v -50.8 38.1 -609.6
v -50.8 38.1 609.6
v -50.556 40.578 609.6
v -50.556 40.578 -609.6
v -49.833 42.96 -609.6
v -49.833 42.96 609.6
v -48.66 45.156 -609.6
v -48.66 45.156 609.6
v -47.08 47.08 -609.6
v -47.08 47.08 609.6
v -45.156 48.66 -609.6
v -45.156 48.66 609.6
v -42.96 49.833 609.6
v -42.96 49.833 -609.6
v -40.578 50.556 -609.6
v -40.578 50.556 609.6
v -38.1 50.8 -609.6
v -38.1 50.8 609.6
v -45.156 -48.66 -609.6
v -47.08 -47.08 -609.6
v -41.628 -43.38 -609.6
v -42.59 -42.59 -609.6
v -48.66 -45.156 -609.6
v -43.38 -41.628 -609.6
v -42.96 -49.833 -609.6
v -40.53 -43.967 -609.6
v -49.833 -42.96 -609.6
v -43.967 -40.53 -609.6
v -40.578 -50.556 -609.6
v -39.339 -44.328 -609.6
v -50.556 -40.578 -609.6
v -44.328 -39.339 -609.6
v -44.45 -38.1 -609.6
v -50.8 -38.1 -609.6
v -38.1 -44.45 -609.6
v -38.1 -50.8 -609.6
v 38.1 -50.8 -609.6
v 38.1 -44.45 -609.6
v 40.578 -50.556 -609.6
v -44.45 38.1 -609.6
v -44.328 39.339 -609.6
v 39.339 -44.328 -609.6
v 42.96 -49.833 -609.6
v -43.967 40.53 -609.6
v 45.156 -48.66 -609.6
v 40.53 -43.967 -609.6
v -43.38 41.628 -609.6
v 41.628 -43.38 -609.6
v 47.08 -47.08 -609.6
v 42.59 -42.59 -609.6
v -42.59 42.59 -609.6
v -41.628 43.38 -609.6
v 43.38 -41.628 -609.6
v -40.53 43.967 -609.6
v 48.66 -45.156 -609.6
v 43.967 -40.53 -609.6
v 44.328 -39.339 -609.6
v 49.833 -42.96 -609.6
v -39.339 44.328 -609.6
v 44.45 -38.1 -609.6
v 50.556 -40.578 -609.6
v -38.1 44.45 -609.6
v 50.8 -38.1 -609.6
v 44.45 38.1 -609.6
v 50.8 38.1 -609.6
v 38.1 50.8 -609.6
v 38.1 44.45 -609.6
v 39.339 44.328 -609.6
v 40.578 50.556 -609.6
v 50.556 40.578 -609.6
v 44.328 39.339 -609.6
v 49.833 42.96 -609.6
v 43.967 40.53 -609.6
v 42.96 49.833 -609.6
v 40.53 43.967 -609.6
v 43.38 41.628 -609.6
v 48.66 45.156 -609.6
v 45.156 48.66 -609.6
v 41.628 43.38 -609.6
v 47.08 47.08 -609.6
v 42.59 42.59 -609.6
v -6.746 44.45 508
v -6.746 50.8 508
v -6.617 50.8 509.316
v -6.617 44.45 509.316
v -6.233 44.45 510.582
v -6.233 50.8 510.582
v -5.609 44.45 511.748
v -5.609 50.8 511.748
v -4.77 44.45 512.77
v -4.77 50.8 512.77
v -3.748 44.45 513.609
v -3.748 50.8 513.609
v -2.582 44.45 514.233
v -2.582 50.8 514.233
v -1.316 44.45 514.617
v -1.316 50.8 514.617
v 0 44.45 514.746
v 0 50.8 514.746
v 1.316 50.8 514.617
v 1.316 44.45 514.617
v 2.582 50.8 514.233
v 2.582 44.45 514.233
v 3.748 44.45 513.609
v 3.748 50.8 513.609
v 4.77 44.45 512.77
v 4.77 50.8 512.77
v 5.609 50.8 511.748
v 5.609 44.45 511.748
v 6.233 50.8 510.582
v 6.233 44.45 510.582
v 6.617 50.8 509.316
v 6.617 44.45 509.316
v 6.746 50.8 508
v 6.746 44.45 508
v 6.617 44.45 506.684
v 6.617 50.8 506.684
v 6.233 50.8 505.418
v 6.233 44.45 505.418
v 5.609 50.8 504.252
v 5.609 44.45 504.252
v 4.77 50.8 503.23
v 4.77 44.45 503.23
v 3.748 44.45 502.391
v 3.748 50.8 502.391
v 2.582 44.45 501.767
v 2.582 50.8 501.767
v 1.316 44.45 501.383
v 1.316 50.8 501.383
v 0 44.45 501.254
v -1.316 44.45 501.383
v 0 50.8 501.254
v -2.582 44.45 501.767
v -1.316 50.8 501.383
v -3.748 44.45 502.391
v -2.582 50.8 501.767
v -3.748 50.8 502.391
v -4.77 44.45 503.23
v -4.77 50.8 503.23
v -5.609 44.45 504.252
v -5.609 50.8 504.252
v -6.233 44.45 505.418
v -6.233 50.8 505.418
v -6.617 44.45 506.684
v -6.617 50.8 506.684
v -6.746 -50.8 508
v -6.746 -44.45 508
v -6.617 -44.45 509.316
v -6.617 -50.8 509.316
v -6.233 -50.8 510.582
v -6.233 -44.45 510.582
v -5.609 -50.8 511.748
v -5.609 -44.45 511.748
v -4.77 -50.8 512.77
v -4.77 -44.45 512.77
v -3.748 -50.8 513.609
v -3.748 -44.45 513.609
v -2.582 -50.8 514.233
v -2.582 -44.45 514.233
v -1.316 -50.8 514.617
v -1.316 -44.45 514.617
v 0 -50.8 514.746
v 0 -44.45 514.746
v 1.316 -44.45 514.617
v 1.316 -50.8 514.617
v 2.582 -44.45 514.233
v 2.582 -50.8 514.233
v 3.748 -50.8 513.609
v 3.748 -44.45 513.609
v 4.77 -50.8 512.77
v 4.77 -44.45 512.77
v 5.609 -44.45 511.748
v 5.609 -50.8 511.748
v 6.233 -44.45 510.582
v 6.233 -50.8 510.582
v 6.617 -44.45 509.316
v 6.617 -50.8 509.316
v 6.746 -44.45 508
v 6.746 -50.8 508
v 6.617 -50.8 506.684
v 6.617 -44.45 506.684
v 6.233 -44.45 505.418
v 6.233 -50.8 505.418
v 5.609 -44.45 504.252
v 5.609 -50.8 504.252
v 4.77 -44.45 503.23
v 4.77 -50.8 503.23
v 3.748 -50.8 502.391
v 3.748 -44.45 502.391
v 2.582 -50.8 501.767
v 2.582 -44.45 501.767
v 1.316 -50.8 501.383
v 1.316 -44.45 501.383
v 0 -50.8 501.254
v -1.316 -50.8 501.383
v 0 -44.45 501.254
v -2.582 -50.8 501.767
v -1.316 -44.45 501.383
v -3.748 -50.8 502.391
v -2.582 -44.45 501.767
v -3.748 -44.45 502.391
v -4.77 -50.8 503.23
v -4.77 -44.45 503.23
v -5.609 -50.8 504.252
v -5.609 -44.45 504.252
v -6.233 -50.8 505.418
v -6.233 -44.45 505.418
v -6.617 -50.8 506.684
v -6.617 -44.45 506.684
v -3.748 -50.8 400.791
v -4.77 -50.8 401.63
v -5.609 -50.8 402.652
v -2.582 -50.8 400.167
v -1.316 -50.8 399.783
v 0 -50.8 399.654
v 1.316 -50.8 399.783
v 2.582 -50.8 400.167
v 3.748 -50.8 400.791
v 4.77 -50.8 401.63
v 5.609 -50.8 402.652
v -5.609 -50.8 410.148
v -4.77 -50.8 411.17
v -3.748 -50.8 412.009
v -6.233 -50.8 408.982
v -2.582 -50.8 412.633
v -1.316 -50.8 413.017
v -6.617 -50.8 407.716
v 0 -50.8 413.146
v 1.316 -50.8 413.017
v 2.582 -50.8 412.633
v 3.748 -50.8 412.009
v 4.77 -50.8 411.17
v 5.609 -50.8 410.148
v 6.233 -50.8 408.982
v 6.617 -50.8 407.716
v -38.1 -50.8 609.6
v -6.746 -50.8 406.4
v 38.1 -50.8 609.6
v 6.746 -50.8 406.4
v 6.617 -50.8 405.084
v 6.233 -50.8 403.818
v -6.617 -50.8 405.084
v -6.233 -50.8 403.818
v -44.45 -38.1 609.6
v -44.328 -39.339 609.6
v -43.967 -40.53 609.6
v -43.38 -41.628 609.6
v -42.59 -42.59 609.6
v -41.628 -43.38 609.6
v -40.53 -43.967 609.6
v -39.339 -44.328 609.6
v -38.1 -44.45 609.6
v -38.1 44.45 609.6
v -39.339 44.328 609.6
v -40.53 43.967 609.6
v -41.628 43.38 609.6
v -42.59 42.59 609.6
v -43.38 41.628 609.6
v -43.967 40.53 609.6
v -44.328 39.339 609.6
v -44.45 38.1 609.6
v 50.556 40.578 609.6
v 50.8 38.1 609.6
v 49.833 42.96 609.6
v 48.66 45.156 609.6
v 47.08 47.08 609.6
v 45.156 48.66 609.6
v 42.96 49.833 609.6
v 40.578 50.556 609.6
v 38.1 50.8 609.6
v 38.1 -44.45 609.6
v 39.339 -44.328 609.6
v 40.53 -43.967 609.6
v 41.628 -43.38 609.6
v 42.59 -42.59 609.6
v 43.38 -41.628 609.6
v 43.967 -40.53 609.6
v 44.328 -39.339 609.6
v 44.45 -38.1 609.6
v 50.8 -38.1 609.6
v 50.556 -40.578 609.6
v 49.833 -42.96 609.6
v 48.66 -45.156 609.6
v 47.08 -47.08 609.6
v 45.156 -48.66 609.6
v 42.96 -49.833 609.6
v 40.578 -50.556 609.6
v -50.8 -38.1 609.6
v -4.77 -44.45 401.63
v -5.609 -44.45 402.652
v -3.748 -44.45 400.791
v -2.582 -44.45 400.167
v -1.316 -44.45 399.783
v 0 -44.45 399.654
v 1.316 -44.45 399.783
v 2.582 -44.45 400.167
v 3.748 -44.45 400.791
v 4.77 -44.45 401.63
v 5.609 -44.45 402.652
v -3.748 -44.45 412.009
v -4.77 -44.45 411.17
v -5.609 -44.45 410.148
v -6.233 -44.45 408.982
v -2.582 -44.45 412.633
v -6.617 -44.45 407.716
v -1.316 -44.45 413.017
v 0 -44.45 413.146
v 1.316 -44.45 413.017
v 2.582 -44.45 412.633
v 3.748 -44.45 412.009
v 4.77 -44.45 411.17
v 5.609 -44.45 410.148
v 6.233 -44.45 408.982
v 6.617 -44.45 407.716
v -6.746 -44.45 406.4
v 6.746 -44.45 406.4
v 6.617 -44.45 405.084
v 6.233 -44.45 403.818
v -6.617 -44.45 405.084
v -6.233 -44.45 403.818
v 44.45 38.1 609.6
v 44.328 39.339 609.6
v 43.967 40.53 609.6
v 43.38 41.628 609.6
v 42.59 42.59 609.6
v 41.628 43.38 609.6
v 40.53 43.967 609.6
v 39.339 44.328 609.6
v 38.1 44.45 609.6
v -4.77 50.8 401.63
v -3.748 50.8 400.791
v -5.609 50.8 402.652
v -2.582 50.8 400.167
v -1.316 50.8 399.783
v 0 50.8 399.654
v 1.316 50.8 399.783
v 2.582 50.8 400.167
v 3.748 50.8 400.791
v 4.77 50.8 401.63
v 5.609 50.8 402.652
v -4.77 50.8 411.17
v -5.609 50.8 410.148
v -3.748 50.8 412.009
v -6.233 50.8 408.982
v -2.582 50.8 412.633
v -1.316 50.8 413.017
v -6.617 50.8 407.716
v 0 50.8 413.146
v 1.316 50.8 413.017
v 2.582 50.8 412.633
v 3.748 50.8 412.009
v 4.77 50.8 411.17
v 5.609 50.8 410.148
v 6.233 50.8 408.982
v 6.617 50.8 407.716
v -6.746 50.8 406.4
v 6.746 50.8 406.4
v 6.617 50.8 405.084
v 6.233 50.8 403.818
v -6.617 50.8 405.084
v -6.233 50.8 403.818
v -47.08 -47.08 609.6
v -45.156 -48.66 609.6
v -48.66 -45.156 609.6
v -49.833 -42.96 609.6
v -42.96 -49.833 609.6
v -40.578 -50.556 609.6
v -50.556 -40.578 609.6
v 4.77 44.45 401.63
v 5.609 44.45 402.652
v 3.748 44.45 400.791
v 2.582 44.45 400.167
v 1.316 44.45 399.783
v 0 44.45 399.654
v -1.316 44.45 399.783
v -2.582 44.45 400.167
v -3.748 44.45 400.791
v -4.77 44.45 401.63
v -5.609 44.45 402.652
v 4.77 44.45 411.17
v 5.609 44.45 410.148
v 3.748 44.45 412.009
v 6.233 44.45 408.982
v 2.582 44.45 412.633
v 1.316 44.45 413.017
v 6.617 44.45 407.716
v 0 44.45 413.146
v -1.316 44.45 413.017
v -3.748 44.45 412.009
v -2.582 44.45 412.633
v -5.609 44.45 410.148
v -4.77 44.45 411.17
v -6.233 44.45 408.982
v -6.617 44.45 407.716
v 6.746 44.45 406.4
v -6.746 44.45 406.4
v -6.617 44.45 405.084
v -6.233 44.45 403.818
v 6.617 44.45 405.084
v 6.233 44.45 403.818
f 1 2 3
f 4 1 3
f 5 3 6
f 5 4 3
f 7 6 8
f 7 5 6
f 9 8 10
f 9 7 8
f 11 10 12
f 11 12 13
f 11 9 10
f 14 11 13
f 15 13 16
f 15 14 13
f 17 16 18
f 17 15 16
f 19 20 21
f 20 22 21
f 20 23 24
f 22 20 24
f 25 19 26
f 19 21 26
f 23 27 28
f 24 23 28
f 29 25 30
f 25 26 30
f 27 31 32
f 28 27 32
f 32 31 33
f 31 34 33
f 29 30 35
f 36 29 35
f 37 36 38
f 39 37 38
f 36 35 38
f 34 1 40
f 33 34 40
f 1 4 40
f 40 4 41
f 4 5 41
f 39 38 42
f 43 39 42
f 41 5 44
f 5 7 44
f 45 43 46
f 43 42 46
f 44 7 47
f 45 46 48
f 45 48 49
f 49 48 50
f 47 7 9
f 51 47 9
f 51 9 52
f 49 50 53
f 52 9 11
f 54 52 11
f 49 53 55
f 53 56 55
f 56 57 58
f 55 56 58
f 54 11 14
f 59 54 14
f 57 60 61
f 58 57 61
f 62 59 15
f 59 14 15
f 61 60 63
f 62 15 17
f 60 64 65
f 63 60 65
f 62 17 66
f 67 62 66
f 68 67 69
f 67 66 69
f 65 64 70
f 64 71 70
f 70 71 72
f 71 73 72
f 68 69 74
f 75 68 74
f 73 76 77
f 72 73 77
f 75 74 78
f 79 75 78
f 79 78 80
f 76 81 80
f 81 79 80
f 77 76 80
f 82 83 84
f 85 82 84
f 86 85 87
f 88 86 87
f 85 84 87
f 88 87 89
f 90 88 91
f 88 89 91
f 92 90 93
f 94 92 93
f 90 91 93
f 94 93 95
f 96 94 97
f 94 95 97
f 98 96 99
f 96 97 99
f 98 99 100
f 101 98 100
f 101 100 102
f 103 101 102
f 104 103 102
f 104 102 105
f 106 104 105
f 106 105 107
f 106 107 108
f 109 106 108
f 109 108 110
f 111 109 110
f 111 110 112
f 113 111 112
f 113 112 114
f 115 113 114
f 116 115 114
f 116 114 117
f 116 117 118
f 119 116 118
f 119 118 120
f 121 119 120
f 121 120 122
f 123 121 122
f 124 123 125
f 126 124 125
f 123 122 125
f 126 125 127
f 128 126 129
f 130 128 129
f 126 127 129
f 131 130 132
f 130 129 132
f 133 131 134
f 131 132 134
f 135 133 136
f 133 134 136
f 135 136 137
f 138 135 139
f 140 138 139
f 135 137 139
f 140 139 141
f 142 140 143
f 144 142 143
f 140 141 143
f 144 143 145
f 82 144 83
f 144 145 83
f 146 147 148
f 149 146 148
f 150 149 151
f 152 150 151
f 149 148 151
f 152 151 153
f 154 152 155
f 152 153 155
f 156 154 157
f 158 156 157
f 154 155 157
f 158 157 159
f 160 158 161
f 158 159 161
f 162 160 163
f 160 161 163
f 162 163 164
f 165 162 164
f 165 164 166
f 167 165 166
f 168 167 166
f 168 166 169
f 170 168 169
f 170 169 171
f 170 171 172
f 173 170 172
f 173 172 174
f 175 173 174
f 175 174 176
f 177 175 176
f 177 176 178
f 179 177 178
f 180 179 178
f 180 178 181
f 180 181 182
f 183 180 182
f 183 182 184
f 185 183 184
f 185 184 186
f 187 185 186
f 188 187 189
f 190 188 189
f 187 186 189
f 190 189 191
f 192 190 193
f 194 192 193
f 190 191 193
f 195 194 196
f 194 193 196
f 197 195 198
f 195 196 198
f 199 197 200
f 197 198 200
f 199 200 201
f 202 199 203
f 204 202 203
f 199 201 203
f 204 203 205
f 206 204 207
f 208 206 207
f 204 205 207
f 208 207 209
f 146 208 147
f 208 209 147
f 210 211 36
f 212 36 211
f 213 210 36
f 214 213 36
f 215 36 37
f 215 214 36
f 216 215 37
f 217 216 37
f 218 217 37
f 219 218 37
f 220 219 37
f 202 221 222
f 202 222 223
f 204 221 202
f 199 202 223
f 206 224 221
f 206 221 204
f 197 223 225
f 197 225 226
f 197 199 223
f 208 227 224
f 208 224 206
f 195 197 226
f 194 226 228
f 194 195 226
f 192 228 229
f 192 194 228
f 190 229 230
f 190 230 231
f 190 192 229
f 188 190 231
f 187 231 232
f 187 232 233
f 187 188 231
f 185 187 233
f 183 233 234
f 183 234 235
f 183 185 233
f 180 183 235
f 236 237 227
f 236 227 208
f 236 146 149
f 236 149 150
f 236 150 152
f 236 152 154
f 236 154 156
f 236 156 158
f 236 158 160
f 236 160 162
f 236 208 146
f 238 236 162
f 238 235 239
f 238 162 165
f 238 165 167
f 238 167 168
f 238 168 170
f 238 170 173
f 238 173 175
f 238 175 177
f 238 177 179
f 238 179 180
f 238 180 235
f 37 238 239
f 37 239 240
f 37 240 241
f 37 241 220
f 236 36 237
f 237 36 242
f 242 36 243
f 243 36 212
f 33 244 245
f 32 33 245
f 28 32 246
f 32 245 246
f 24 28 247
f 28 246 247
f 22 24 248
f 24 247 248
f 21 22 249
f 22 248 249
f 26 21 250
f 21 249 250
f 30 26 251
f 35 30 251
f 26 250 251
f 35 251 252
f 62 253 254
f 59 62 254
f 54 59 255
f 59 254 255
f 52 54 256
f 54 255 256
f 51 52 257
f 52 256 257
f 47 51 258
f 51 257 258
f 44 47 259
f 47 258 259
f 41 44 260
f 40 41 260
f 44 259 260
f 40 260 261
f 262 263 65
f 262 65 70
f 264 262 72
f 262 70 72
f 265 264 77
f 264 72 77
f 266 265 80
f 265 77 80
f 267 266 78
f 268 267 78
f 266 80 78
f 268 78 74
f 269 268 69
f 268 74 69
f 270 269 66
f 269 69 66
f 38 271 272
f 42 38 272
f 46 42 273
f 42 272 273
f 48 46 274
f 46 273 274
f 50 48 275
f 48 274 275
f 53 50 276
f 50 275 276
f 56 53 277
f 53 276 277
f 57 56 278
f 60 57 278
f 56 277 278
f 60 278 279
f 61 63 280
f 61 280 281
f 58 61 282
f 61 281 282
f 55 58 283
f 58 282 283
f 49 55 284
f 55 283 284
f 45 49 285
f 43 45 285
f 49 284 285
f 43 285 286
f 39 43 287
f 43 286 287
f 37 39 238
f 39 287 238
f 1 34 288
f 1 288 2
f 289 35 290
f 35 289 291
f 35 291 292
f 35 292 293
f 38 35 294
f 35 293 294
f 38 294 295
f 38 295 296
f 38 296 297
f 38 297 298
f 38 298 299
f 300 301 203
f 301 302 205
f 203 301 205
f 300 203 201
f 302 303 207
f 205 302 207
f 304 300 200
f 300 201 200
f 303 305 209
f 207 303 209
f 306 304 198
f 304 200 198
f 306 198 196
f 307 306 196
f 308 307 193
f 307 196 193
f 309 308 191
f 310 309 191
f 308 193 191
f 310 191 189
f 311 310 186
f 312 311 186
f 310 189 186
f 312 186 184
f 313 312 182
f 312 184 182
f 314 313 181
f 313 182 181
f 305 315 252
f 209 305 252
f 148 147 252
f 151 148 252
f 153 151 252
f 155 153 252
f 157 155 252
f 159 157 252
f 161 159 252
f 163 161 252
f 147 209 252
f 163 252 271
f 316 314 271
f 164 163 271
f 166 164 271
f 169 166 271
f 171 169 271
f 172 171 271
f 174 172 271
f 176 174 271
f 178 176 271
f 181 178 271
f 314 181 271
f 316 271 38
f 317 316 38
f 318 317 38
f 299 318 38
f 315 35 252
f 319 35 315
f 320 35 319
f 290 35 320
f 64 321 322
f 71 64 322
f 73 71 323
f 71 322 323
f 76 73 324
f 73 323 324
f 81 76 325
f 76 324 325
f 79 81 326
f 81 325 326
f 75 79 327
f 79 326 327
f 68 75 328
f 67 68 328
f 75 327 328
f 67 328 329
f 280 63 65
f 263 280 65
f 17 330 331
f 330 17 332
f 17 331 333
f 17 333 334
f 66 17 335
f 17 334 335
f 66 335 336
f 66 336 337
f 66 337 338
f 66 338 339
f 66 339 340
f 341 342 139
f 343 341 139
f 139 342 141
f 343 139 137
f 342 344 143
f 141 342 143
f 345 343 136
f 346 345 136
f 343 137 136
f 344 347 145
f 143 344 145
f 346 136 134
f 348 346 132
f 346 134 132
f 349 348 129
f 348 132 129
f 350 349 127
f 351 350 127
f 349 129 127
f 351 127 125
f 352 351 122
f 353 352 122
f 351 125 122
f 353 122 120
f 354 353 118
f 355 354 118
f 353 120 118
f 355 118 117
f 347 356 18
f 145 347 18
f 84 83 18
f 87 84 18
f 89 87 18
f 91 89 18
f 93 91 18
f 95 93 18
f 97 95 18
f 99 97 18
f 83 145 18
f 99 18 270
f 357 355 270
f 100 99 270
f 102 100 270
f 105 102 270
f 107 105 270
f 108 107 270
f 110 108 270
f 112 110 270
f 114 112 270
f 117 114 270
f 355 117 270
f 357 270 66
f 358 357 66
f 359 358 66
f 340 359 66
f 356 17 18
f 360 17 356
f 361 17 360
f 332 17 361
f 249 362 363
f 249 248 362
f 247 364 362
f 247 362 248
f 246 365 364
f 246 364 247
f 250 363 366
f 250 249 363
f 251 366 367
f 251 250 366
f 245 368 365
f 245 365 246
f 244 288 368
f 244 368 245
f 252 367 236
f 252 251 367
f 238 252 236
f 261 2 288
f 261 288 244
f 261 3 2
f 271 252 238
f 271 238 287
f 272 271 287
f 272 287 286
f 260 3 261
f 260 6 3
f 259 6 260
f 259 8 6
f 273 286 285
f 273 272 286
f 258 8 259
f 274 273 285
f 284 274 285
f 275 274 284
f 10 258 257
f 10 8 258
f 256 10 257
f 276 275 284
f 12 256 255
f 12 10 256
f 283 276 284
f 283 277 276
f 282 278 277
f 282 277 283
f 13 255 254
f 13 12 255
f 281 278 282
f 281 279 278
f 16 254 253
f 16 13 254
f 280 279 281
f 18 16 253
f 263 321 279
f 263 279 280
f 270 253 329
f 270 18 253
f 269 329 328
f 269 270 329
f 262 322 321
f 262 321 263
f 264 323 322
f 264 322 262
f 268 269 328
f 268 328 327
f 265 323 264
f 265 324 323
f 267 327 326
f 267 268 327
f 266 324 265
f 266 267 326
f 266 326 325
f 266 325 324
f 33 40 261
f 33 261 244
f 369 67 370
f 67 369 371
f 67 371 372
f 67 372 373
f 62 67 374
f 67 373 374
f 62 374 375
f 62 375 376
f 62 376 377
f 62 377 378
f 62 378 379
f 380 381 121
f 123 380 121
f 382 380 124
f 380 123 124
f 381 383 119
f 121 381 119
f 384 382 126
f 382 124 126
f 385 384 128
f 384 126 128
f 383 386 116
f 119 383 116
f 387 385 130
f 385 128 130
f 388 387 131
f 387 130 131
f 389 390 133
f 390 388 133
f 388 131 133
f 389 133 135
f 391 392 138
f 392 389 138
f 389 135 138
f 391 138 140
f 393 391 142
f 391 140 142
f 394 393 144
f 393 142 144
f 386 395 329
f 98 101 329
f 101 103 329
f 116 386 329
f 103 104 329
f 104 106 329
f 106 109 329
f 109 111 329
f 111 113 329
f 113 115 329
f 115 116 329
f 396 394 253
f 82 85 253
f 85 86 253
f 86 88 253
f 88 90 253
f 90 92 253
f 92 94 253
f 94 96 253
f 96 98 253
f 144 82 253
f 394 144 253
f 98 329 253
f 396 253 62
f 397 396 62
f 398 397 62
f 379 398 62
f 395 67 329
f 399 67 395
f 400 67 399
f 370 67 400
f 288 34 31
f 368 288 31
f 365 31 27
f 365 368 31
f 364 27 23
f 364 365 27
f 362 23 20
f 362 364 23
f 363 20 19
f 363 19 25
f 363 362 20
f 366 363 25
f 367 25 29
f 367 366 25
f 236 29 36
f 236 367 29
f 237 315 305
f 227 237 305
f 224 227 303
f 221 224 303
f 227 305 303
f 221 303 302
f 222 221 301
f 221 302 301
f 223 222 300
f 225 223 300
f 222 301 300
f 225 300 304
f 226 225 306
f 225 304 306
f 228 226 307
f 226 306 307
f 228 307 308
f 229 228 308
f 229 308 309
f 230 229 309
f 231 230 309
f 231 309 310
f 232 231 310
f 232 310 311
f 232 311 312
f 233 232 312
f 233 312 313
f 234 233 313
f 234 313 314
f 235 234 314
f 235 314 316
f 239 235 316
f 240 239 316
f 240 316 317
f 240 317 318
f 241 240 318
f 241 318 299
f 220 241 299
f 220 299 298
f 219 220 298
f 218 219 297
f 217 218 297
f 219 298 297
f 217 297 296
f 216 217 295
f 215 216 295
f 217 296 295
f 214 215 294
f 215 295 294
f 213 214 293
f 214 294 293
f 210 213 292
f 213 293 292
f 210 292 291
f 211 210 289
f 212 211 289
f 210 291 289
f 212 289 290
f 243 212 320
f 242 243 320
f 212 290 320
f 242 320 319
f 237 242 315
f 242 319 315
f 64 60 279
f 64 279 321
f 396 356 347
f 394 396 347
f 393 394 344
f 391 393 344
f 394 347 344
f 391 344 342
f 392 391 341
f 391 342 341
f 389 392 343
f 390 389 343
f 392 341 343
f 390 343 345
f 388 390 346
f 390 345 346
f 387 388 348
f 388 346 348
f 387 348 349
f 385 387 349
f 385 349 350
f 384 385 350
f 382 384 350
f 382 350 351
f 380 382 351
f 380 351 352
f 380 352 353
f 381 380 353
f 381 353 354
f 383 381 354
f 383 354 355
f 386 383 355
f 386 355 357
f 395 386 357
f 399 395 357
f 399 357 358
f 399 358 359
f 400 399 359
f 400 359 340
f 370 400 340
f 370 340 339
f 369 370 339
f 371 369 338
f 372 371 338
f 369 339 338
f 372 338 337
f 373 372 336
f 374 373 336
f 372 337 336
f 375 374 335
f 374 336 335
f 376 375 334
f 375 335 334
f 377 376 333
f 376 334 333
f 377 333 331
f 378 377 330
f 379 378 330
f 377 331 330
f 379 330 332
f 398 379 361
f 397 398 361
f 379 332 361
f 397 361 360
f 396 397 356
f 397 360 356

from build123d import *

# Parameters (mm, degrees)
F0_W          = 101.6
F0_H          = 101.6
F1_DEPTH      = 609.6
F2_R          = 12.7
F4_DEPTH      = 609.601
F4_DEPTH_BACK = 609.601
F6_D          = 13.49248


with BuildPart() as f1:
    # F0 (on Top) → F1 (new body, symmetric)
    with BuildSketch(Plane.XY):
        Rectangle(F0_W, F0_H)
    extrude(amount=F1_DEPTH, both=True)

    # F2
    f2_edges = [f1.edges().sort_by_distance(p)[0] for p in [
        (-50.8, 50.8, 0),
        (50.8, 50.8, 0),
        (50.8, -50.8, 0),
        (-50.8, -50.8, 0),
    ]]
    fillet(f2_edges, radius=F2_R)

    # F3 (on Top) → F4 (cut, two sides)
    with BuildSketch(Plane.XY) as f4_sk:
        with BuildLine():
            Line((38.1, 44.45), (-38.1, 44.45))
            ThreePointArc((-38.1, 44.45), (-42.5901280605, 42.5901280605), (-44.45, 38.1))
            Line((-44.45, 38.1), (-44.45, -38.1))
            ThreePointArc((-44.45, -38.1), (-42.5901280605, -42.5901280605), (-38.1, -44.45))
            Line((-38.1, -44.45), (38.1, -44.45))
            ThreePointArc((38.1, -44.45), (42.5901280605, -42.5901280605), (44.45, -38.1))
            Line((44.45, -38.1), (44.45, 38.1))
            ThreePointArc((44.45, 38.1), (42.5901280605, 42.5901280605), (38.1, 44.45))
        make_face()
    extrude(amount=-F4_DEPTH, mode=Mode.SUBTRACT)
    extrude(f4_sk.sketch, amount=F4_DEPTH_BACK, mode=Mode.SUBTRACT)

    # F6 (through all)
    with Locations(Plane.XZ.offset(50.8)):
        with Locations((0, 508), (0, 406.4)):
            Hole(F6_D / 2)


solid = f1.part
